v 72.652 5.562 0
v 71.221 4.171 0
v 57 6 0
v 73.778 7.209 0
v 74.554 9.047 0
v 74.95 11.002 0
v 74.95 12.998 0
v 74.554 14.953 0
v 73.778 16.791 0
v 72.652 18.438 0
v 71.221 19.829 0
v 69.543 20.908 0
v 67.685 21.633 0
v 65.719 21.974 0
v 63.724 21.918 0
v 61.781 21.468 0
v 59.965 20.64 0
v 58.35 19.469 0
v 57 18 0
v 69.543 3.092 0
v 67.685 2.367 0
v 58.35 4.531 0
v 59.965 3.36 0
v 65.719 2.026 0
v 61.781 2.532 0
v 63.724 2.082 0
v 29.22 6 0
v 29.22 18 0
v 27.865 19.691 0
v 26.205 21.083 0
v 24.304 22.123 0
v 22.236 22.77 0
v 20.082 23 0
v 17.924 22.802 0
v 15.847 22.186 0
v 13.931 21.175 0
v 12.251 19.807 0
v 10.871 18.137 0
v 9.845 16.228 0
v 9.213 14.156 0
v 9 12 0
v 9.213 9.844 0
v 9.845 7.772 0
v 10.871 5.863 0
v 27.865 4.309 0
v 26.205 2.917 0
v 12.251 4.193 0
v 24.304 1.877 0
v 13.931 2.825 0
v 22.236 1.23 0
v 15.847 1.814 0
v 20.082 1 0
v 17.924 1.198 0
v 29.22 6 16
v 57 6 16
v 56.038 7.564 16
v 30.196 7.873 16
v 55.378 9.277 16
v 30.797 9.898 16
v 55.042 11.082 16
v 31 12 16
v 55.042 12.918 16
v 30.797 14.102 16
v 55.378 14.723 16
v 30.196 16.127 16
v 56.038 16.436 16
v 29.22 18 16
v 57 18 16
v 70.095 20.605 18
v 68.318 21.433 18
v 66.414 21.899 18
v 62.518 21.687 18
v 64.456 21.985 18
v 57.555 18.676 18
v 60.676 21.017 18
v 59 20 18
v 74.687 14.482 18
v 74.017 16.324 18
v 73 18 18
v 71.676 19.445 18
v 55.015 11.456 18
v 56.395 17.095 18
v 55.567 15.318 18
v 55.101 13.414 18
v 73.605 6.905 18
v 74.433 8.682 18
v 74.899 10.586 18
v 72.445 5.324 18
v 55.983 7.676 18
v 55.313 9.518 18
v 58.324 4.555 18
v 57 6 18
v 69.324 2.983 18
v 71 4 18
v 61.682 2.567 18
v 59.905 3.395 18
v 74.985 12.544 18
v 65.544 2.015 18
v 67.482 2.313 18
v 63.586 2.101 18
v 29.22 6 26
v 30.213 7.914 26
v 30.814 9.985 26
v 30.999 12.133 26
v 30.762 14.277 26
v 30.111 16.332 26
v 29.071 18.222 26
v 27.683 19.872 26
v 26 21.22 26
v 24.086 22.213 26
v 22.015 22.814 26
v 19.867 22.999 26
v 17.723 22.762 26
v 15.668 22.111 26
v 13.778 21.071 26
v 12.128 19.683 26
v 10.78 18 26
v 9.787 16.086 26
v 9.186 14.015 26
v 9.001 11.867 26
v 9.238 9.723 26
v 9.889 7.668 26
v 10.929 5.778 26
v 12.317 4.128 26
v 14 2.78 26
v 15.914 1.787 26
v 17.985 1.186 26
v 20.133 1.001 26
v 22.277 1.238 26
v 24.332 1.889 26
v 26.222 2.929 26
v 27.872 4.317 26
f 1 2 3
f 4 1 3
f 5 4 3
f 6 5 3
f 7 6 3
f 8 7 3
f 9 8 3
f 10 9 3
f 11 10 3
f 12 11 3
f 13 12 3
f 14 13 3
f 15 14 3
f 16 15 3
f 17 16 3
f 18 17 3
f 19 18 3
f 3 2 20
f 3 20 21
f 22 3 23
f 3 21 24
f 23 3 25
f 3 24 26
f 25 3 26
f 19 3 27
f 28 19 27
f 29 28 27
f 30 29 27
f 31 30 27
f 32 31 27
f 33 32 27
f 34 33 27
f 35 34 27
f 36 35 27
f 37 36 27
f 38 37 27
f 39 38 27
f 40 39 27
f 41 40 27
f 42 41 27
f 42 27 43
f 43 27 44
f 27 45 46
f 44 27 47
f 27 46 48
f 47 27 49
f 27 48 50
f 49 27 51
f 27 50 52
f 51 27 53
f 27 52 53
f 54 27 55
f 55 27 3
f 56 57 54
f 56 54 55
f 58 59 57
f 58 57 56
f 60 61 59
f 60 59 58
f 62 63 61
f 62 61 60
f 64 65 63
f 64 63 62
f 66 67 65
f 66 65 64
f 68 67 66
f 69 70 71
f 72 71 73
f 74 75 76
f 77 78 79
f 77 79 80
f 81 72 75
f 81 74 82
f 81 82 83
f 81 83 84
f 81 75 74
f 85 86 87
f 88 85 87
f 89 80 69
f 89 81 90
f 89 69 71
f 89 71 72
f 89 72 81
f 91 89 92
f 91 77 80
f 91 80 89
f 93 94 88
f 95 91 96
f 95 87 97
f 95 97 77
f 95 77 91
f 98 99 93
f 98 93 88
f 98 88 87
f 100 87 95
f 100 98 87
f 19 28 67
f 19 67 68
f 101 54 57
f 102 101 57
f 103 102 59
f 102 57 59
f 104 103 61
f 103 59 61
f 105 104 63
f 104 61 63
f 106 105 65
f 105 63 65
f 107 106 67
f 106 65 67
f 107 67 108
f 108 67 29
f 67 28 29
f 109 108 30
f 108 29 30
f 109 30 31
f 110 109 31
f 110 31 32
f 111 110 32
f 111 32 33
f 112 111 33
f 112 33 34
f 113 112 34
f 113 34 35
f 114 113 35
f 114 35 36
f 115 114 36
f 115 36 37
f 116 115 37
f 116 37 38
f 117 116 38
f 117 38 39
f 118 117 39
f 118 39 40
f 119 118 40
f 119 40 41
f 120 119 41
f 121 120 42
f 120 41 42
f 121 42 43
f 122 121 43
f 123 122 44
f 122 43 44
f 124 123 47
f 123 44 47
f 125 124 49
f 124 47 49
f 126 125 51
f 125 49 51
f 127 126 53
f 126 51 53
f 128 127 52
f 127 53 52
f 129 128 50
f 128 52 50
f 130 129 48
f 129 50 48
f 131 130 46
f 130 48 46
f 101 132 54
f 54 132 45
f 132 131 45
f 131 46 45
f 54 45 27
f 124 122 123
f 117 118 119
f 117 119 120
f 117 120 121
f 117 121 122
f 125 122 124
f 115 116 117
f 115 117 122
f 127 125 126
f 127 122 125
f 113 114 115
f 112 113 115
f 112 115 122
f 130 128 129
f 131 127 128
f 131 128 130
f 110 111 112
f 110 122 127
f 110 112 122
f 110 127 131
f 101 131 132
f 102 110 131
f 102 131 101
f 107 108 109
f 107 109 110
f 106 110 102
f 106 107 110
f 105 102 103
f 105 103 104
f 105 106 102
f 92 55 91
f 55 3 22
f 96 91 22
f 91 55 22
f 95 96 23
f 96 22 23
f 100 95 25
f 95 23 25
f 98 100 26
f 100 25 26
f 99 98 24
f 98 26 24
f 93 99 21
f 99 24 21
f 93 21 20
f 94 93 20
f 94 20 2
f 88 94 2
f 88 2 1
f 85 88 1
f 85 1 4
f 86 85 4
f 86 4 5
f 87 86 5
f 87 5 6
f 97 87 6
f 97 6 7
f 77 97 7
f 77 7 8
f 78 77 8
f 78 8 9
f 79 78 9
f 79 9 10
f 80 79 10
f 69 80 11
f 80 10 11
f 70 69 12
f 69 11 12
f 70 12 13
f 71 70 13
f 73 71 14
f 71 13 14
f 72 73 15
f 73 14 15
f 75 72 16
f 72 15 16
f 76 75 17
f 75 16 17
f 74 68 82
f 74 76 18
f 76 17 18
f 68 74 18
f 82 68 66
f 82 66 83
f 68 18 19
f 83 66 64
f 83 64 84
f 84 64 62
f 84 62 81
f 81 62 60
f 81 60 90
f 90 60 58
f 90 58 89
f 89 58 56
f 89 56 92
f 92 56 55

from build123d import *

# Parameters (mm, degrees)
SKETCH_3_W    = 45
SKETCH_3_H    = 12
BAR_DEPTH     = 16
SKETCH_4_R    = 11
ROOTHUB_DEPTH = 26
SKETCH_5_R    = 10
ENDHUB_DEPTH  = 18


with BuildPart() as part:
    # 草图3 → Bar (new body)
    with BuildSketch(Plane.XY):
        with Locations((42.5, 12)):
            Rectangle(SKETCH_3_W, SKETCH_3_H)
    extrude(amount=BAR_DEPTH)

    # 草图4 → RootHub (add)
    with BuildSketch(Plane.XY):
        with Locations(Location((20, 12, 0), (0, 0, 326.944268849))):
            Circle(SKETCH_4_R)
    extrude(amount=ROOTHUB_DEPTH)

    # 草图5 → EndHub (add)
    with BuildSketch(Plane.XY):
        with Locations(Location((65, 12, 0), (0, 0, 216.869897646))):
            Circle(SKETCH_5_R)
    extrude(amount=ENDHUB_DEPTH)


solid = part.part
